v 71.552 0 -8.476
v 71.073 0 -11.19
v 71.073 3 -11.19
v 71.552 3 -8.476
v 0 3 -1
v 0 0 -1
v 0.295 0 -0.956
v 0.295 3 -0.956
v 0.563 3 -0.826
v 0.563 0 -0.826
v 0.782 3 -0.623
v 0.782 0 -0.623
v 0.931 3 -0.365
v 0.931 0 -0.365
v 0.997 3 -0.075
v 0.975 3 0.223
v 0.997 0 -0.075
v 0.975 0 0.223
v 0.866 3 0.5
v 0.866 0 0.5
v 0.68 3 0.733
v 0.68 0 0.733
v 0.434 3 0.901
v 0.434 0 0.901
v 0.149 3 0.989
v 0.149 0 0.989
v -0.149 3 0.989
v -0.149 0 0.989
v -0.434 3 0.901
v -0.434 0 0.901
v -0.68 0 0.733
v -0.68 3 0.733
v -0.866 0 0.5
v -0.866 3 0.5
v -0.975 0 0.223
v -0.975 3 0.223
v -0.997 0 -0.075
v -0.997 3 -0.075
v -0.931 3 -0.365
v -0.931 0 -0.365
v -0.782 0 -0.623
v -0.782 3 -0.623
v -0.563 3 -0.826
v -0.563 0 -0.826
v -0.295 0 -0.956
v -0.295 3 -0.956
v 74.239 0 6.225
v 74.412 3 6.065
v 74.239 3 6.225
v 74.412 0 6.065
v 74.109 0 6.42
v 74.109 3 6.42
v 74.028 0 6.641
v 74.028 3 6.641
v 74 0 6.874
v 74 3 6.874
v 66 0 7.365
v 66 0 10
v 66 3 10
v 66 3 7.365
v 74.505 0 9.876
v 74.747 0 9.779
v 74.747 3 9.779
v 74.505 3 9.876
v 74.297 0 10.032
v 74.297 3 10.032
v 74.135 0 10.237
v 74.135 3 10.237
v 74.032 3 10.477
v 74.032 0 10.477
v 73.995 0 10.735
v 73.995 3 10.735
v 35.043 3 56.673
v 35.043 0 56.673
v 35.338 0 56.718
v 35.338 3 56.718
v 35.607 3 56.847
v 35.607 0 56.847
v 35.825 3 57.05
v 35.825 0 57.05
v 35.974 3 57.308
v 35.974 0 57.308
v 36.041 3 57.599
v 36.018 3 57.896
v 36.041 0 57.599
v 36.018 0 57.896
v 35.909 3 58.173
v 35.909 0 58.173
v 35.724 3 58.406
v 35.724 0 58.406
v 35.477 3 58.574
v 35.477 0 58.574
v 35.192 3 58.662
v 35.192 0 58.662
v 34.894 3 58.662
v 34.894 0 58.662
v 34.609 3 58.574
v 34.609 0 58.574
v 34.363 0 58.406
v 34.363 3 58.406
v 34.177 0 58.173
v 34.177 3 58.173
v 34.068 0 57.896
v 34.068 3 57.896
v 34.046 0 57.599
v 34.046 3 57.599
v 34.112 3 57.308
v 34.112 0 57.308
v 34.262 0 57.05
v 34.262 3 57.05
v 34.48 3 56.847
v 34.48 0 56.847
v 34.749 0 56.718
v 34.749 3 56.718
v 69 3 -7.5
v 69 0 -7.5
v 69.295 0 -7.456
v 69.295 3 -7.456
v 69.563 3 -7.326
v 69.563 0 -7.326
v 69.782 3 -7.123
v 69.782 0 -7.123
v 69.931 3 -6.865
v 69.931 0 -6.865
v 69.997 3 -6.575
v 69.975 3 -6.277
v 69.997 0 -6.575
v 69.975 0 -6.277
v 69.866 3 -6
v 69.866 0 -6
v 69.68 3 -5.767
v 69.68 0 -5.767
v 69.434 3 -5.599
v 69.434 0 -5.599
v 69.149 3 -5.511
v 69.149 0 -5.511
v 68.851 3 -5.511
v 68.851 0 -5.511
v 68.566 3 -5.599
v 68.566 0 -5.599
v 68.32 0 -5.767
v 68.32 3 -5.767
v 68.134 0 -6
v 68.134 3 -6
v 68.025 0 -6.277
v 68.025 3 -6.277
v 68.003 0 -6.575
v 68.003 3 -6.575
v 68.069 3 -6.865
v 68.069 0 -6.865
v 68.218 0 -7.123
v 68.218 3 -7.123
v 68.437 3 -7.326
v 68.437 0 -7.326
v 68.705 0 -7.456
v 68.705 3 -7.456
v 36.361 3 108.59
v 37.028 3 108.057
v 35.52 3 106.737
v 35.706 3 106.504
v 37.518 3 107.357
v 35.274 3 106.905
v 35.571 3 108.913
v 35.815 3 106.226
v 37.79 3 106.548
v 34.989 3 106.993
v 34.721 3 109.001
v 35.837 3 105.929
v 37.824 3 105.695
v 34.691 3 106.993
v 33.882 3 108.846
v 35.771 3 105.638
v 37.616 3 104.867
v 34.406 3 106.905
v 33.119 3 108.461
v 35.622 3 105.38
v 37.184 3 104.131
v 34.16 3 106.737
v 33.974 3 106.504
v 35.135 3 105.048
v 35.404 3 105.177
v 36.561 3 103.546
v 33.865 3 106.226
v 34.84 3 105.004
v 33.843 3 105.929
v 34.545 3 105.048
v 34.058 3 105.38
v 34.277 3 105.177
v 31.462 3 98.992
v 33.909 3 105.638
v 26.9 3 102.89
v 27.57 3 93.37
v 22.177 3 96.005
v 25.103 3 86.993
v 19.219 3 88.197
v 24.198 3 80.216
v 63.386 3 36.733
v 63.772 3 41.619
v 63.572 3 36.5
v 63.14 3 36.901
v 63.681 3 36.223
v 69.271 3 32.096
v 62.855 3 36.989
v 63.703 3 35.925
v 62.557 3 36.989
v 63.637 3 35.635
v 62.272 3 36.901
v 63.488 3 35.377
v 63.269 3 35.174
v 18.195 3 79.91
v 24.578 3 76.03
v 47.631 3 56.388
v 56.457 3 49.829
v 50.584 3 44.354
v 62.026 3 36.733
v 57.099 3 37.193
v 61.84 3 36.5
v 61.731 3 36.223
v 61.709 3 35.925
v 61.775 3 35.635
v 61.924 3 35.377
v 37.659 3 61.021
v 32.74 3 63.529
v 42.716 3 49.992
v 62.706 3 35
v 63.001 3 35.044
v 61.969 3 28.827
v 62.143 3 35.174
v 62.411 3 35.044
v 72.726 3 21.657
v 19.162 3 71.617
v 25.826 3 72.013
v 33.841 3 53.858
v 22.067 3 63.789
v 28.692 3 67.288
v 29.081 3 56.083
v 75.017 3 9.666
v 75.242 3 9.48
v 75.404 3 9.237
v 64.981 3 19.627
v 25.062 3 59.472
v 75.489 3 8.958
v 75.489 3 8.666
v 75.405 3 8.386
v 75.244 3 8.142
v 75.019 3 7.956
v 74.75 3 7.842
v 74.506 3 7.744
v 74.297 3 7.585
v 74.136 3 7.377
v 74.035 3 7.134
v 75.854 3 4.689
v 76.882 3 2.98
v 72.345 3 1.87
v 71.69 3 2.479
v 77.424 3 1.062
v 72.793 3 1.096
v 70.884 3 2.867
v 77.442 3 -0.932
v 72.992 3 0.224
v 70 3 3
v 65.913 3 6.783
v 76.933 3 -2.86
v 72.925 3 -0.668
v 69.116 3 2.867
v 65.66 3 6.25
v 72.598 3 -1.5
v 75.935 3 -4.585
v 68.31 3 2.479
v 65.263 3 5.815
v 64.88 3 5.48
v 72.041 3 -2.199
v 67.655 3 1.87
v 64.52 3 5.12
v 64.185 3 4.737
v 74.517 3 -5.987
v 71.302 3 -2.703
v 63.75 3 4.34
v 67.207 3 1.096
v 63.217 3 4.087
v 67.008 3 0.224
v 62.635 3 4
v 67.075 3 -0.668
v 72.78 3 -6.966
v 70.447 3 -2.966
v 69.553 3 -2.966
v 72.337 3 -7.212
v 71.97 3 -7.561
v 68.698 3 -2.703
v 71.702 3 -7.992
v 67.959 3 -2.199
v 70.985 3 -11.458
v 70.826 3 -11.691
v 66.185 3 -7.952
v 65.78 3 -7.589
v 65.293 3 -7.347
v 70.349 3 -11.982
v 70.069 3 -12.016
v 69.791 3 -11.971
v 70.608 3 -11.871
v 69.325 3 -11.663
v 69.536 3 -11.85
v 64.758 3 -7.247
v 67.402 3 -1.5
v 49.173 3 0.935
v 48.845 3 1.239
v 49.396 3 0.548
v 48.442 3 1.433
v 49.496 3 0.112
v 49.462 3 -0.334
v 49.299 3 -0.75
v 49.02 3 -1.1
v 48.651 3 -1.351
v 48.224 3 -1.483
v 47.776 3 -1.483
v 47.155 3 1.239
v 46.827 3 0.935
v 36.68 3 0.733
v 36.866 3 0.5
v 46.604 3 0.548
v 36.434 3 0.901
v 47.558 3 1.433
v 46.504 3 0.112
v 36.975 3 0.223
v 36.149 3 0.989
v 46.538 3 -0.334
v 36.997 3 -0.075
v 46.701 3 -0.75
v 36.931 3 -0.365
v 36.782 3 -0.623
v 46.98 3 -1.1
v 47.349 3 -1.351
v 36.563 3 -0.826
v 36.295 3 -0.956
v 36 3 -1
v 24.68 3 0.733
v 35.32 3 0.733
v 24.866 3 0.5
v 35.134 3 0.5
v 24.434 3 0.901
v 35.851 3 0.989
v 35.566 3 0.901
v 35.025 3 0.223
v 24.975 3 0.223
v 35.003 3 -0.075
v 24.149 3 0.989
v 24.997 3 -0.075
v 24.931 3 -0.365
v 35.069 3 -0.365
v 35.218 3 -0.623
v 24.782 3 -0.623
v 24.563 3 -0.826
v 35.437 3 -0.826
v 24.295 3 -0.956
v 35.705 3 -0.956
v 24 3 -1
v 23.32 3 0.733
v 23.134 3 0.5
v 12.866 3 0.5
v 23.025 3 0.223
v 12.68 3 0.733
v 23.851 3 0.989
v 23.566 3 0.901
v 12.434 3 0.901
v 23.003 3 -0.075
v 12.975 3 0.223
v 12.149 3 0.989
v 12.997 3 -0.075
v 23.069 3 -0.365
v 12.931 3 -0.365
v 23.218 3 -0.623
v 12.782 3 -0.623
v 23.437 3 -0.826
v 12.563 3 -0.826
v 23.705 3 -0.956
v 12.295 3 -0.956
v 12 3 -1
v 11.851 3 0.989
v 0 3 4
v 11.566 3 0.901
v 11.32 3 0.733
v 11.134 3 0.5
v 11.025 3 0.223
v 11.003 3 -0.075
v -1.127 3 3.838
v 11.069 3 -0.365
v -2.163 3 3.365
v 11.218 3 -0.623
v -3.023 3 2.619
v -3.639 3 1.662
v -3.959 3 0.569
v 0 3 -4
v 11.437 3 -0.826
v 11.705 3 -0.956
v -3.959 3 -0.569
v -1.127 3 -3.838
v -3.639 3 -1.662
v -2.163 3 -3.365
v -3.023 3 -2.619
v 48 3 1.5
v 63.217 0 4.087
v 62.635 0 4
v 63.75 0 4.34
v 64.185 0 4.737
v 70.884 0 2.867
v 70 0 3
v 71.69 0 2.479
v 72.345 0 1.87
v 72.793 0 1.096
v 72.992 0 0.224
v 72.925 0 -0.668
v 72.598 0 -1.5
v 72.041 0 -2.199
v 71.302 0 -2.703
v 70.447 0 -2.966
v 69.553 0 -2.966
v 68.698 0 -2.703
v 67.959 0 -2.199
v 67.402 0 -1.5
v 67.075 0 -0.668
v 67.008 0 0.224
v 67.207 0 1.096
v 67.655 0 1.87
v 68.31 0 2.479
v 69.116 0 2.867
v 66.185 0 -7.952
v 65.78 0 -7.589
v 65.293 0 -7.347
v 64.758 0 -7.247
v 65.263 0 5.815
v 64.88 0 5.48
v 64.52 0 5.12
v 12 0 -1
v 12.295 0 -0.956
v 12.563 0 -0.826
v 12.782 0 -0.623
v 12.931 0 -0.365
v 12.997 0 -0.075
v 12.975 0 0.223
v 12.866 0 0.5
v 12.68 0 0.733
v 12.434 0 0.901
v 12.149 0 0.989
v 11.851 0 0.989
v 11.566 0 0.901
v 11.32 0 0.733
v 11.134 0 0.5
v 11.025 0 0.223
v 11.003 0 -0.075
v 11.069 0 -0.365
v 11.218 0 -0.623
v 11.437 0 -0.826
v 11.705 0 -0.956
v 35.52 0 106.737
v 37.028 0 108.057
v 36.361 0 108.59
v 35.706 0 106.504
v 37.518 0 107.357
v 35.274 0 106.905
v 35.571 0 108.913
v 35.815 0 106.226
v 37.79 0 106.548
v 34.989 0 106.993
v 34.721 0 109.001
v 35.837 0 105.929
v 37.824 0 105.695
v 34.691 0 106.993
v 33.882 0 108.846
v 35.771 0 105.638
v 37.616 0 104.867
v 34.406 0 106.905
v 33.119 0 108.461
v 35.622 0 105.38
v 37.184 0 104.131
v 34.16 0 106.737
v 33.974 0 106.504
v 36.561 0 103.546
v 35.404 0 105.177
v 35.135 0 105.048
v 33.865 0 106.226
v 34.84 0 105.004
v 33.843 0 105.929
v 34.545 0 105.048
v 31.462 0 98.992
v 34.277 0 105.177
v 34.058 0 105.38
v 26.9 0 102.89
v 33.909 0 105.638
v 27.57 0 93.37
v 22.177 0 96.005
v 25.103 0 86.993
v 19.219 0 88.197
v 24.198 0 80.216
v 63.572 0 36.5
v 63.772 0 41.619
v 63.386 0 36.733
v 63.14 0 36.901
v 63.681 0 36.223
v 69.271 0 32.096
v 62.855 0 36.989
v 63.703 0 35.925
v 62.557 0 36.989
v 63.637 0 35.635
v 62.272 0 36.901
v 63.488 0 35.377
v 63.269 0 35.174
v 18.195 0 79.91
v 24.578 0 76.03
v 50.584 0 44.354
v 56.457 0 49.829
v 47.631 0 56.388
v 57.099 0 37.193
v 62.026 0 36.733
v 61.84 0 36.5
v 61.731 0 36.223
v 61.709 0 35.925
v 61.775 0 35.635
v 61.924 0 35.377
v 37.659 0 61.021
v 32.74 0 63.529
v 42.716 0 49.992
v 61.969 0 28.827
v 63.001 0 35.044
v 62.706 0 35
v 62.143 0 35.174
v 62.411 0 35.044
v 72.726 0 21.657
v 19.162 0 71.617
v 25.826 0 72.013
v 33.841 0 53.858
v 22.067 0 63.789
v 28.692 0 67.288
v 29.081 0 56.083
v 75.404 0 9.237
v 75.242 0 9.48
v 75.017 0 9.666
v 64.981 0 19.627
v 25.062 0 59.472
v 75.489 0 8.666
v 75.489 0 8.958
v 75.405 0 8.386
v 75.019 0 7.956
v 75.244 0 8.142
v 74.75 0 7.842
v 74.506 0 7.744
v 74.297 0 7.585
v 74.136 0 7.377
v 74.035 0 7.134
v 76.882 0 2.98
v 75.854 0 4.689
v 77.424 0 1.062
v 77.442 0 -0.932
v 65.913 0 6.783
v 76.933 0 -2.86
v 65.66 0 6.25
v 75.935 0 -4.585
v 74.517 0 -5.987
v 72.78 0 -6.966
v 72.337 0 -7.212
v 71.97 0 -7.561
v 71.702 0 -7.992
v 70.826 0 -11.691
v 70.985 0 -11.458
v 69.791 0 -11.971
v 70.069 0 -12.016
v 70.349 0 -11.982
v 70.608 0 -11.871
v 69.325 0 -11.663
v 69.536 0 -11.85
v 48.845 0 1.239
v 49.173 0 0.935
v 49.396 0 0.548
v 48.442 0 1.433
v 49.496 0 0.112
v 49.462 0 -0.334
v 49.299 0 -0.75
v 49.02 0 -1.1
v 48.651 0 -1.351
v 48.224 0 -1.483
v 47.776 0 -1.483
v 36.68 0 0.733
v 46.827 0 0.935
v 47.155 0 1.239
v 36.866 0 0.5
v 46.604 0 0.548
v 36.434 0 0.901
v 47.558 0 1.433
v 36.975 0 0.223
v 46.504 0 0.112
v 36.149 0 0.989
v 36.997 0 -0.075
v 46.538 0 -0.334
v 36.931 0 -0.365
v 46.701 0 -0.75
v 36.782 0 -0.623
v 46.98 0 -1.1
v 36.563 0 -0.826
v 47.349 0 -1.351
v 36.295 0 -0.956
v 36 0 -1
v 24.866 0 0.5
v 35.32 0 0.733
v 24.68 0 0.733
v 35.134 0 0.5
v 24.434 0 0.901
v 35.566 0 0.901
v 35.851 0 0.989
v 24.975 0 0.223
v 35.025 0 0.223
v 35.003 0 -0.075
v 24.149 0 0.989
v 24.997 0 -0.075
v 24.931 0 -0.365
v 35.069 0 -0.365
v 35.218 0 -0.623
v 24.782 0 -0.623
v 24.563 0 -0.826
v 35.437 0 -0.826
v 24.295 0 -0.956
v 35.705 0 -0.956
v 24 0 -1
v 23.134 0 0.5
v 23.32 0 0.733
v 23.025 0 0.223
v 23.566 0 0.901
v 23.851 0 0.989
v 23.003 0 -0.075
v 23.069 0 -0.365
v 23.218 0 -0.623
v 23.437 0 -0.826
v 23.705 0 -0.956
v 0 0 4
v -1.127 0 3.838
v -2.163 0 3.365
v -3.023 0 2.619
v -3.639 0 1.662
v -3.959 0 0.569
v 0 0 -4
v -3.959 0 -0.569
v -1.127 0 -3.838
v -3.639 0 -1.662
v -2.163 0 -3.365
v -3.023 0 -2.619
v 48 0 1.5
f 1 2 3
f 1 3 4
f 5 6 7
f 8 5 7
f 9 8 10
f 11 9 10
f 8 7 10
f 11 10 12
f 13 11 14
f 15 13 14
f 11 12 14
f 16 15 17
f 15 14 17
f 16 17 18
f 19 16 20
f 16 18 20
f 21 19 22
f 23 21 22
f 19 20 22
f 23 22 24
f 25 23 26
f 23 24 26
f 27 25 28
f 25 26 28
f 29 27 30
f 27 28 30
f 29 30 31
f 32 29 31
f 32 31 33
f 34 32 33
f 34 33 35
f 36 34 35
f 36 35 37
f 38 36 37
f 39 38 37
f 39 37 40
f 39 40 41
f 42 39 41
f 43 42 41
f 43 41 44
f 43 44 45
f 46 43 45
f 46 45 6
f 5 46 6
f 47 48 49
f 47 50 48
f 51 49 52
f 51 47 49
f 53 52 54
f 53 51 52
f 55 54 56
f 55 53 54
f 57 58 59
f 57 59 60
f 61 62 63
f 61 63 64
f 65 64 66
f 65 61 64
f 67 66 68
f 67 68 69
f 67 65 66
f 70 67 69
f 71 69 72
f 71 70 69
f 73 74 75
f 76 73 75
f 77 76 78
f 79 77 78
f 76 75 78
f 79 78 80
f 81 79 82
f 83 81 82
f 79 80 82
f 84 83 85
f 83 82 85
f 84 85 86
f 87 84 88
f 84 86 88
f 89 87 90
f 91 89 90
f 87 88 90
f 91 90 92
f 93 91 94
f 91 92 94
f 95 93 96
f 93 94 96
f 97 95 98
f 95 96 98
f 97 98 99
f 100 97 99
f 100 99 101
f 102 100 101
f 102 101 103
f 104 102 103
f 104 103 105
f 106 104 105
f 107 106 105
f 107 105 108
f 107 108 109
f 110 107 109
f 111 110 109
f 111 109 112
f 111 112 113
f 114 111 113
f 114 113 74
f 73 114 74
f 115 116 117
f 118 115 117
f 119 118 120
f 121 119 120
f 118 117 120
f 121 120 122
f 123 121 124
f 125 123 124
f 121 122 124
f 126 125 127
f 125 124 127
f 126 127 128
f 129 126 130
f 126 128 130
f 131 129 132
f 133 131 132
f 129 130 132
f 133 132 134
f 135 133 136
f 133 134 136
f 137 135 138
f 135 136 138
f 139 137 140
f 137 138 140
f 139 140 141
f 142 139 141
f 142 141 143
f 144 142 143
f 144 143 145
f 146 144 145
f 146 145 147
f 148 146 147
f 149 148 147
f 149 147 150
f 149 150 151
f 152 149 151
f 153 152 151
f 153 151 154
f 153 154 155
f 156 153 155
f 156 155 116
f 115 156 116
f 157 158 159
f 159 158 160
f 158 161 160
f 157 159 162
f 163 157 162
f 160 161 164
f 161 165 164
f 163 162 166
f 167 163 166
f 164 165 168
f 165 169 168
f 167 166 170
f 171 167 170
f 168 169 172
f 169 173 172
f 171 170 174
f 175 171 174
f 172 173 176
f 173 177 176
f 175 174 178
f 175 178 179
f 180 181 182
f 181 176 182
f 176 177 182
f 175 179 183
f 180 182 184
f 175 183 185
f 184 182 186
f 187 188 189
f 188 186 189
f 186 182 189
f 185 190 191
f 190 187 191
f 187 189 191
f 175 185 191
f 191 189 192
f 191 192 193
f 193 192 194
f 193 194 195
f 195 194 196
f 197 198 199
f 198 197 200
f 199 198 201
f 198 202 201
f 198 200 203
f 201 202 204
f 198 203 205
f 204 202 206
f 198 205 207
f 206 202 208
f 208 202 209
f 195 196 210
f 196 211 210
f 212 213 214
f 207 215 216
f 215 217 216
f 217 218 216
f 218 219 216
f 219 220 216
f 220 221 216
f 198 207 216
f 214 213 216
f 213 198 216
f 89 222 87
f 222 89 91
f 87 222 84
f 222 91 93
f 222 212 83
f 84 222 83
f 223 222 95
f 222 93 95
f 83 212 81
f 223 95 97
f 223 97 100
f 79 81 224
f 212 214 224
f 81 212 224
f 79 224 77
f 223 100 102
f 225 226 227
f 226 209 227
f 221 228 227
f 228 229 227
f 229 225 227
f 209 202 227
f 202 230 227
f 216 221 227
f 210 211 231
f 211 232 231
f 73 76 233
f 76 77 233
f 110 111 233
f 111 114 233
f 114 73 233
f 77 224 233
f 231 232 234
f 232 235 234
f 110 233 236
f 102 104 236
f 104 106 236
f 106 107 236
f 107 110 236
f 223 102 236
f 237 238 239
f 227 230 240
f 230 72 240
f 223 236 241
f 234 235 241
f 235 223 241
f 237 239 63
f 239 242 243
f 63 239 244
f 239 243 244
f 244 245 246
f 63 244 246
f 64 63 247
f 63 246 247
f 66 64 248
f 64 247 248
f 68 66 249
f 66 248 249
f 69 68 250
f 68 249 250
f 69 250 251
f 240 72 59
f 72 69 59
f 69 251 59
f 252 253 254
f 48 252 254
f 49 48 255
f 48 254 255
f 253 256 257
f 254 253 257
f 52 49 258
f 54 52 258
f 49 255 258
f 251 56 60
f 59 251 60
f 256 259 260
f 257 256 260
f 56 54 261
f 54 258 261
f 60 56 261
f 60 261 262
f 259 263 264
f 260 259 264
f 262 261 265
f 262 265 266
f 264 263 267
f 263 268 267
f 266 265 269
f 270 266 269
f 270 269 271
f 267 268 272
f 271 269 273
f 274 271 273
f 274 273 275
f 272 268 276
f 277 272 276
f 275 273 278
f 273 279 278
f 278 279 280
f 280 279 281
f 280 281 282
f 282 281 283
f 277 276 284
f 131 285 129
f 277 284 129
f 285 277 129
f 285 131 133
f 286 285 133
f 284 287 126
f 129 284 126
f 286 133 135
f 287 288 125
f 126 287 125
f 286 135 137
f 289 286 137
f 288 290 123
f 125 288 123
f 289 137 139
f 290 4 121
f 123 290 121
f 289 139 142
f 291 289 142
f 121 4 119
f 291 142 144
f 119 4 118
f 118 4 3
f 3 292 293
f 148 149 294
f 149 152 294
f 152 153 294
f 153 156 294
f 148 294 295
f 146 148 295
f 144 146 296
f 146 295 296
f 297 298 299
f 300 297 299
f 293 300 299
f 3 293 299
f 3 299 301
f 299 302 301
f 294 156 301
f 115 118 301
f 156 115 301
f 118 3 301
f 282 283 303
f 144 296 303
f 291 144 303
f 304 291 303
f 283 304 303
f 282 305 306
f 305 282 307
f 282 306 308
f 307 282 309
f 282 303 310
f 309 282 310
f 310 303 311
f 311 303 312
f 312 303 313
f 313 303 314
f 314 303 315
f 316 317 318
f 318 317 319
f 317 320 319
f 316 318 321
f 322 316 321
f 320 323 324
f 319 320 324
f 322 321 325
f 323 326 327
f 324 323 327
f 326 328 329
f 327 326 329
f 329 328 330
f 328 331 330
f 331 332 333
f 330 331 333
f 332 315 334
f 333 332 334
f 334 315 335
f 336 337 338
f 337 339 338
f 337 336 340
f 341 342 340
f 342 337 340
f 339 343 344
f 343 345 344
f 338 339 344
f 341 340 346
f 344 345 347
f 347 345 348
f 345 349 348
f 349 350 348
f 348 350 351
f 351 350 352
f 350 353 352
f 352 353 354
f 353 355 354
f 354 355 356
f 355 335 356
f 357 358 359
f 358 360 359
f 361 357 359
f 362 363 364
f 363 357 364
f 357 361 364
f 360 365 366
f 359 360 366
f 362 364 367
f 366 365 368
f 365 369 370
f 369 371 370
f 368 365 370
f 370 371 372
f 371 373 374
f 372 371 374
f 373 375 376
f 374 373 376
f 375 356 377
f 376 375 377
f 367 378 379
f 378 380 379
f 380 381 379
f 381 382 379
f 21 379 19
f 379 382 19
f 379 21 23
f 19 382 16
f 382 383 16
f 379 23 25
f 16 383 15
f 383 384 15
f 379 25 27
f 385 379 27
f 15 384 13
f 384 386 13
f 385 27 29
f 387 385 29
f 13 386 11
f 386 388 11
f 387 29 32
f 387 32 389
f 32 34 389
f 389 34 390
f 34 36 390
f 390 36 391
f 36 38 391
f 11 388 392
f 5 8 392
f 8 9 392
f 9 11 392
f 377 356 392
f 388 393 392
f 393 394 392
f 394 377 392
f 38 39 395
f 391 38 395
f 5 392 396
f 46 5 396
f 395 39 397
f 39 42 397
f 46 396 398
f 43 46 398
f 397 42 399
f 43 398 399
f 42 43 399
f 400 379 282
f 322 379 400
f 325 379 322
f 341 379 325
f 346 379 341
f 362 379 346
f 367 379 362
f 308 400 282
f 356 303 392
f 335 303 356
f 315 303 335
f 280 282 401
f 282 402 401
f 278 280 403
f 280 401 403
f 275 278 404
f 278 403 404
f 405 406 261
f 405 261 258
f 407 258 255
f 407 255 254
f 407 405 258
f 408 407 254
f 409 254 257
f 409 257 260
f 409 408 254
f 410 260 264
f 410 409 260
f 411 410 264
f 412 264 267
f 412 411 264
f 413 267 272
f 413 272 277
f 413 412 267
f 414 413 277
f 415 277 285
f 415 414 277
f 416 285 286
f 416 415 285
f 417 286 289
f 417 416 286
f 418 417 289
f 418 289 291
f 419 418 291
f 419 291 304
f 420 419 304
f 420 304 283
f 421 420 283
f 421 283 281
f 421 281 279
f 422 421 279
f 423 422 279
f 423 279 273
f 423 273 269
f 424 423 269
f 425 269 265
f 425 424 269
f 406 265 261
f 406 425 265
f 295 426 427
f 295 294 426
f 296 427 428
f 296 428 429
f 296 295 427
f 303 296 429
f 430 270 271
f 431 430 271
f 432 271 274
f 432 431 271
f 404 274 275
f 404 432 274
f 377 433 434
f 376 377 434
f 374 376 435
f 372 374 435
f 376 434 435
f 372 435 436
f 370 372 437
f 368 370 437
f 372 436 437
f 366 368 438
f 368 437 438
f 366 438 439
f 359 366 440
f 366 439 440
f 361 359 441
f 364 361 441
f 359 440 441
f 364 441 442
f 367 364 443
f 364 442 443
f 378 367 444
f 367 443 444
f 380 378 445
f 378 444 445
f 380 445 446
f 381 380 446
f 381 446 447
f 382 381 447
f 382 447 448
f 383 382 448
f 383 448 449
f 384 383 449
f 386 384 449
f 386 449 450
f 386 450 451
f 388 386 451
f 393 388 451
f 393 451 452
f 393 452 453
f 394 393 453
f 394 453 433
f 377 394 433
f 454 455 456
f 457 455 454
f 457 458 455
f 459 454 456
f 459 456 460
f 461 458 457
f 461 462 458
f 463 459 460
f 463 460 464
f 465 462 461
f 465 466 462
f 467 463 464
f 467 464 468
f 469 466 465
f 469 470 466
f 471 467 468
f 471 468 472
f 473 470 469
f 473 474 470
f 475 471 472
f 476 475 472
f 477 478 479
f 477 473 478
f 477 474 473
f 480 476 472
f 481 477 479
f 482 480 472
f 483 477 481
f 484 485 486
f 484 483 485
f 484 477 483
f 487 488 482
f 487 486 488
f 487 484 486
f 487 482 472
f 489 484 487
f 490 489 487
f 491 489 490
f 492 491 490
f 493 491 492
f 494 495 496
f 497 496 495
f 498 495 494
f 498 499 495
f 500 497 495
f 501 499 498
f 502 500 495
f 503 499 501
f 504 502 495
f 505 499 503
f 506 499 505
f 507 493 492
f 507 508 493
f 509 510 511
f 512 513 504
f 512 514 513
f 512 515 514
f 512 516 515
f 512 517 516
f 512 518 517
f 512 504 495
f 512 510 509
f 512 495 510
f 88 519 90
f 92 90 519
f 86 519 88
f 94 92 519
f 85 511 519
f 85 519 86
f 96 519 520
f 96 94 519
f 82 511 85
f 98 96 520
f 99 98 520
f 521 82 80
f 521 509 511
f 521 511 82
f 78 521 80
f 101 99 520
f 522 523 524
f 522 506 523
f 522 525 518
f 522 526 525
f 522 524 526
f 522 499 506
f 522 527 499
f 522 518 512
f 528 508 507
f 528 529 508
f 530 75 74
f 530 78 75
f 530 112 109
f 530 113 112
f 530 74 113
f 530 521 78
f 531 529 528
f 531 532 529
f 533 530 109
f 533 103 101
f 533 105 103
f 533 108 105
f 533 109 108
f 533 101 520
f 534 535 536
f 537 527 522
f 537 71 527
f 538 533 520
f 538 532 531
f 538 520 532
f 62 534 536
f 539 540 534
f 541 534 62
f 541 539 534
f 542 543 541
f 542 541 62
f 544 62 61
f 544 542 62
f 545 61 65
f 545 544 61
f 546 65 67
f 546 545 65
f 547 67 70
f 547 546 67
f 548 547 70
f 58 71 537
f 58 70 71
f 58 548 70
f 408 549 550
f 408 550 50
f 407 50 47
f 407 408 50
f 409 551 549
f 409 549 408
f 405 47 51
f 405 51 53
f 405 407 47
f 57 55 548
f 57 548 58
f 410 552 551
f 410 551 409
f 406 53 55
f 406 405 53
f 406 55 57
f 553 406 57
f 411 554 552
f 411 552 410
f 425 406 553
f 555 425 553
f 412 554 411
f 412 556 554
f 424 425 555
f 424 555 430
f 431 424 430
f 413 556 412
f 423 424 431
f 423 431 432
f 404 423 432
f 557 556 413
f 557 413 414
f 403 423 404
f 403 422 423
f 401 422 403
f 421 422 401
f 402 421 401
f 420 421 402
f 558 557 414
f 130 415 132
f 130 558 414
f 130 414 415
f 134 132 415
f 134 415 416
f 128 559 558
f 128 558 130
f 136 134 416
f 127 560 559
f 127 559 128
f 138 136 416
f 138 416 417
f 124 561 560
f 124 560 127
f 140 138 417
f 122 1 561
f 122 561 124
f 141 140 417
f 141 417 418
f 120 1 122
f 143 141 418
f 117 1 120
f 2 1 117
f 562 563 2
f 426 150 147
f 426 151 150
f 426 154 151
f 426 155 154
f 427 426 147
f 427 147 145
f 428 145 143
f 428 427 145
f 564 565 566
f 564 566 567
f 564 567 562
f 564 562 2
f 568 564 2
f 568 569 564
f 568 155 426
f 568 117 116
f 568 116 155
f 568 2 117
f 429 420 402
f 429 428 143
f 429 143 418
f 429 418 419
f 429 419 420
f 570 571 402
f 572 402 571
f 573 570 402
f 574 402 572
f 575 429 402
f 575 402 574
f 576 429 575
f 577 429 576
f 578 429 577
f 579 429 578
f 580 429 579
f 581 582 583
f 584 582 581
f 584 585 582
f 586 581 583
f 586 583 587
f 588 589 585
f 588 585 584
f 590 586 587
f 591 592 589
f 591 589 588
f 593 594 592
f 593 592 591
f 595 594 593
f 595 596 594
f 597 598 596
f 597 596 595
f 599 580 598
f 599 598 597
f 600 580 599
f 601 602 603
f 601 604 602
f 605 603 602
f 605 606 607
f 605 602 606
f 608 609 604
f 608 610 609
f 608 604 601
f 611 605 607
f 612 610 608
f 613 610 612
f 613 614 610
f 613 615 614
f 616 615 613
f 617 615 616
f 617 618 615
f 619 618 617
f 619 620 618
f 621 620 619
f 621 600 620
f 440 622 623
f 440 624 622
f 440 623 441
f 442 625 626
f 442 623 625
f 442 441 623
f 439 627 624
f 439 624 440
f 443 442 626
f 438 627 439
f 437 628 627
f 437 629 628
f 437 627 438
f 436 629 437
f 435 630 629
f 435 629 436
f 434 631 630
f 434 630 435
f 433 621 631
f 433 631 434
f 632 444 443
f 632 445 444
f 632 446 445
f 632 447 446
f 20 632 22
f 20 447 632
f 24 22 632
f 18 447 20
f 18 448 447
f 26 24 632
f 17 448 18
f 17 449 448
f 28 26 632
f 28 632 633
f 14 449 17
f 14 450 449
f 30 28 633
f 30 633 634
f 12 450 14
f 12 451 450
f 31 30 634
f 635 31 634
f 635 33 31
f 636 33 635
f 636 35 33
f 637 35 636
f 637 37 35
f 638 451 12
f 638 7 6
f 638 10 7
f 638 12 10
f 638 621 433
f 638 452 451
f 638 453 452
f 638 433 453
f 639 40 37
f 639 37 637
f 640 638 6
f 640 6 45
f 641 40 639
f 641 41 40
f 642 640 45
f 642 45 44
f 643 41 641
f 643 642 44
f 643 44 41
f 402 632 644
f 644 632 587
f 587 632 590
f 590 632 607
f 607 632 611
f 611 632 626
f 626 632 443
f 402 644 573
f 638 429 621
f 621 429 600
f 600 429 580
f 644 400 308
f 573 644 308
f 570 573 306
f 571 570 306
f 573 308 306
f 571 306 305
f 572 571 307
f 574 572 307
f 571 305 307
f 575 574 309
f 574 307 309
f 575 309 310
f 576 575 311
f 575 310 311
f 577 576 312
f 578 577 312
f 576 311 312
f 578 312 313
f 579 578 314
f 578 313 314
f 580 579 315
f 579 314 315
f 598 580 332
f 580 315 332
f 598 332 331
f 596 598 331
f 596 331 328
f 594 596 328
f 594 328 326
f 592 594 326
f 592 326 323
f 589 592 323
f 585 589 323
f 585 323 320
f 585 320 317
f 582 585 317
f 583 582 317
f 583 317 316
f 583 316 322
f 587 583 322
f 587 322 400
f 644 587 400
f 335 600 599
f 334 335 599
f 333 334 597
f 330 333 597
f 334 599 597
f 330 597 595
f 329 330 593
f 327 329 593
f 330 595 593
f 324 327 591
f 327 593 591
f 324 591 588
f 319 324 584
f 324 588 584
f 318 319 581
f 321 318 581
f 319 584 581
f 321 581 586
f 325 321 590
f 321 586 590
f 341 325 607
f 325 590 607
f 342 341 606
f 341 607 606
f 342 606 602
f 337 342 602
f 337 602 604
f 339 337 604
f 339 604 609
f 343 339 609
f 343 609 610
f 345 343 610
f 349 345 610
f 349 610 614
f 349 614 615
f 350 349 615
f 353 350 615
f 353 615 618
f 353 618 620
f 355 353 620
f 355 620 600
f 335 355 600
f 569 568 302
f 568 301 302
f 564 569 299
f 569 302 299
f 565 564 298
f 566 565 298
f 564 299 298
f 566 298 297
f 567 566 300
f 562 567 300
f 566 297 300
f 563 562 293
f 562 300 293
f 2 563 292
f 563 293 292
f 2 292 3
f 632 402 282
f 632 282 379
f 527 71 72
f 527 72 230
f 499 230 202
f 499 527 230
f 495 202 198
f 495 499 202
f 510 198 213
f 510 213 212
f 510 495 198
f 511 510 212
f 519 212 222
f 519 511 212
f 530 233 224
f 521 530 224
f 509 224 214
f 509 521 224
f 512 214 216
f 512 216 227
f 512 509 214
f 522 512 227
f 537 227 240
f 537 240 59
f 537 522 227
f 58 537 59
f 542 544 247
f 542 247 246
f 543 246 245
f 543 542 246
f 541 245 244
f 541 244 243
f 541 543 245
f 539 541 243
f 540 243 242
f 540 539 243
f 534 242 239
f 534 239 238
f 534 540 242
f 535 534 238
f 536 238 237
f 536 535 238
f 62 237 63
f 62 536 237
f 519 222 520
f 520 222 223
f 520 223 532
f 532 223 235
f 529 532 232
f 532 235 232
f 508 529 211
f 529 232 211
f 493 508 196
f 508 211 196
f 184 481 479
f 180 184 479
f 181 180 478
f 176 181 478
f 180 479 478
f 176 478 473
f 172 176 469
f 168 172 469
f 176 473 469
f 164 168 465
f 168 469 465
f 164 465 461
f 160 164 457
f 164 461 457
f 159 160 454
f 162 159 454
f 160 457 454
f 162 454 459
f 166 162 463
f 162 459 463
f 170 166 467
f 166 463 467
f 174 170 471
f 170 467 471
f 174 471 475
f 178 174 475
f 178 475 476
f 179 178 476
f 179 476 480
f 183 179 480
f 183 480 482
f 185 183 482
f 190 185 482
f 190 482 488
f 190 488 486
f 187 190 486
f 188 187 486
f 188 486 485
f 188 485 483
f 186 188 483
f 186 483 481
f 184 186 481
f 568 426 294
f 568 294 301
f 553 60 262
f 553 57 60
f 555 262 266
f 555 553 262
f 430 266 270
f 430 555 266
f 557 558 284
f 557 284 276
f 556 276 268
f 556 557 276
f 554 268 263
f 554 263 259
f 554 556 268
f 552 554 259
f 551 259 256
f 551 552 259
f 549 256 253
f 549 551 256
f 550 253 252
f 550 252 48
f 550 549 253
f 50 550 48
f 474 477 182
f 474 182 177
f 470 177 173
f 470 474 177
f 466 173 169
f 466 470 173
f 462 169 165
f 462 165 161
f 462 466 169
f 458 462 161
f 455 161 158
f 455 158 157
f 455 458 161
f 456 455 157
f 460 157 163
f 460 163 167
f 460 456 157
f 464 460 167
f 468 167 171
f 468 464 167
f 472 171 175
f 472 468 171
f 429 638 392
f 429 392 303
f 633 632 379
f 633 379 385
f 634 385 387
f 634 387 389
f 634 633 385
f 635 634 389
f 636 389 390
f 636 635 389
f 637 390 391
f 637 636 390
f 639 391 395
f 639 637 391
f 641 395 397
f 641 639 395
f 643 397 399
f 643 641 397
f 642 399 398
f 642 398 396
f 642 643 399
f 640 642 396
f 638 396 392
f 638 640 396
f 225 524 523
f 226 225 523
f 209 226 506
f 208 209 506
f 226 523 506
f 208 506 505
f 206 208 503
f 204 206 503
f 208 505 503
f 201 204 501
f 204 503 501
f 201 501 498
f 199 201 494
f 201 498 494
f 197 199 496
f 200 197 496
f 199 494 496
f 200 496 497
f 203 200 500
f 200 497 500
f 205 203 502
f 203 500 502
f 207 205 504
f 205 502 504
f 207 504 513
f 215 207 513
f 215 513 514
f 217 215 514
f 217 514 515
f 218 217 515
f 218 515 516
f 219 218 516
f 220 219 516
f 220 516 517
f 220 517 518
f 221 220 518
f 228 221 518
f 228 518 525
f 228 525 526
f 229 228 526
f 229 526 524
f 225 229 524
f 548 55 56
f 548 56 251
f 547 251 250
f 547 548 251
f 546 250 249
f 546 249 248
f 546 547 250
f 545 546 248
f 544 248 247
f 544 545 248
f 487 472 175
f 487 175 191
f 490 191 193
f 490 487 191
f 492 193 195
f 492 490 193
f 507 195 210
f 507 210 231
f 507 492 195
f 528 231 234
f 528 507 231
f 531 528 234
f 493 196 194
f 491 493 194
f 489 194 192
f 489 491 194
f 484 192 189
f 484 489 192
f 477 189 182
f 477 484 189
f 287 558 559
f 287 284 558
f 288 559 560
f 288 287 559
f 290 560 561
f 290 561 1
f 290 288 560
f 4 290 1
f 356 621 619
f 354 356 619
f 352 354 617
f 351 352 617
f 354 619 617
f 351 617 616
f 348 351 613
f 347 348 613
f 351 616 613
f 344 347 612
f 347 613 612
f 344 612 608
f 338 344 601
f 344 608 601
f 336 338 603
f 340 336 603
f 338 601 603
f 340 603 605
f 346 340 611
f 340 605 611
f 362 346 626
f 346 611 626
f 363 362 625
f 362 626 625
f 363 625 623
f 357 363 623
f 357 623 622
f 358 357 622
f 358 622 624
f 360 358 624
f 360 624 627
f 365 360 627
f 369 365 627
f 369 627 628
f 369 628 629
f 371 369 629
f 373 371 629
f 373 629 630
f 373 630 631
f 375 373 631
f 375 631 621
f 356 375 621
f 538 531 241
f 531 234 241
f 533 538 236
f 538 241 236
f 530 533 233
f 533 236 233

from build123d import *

# Parameters (mm, degrees)
SKETCH_1_R          = 3
EXTRUDE_1_DEPTH     = 3
EXTRUDE_START       = -3
SKETCH_2_R          = 3
EXTRUDE_2_DEPTH     = 3
EXTRUDE_4_DEPTH     = 3
FILLET_1_R          = 20
SKETCH_4_R          = 1
CUT_EXTRUDE_2_DEPTH = 134.77989332
SKETCH_5_R          = 1.5
CUT_EXTRUDE_3_DEPTH = 134.77989332
EXTRUDE_5_DEPTH     = 3
FILLET_2_R          = 2
FILLET_3_R          = 1


with BuildPart() as part:
    # 草图1 → 凸台-拉伸1 (new body)
    with BuildSketch(Plane(origin=(0, 0, 0), x_dir=(1, 0, 0), z_dir=(0, 1, 0))):
        with BuildLine():
            Line((0, 4), (70, 4))
            ThreePointArc((70, 4), (72.828427125, 2.828427125), (74, 0))
            Line((74, 0), (74, -10))
            ThreePointArc((74, -10), (61.386213612, -44.681924543), (29.439223407, -63.157132631))
            ThreePointArc((29.439223407, -63.157132631), (24.635207854, -84.826646437), (36.560916037, -103.546258569))
            ThreePointArc((36.560916037, -103.546258569), (37.297642861, -107.724444011), (33.119457419, -108.461170835))
            ThreePointArc((33.119457419, -108.461170835), (18.340459825, -82.982499926), (28.246224292, -55.243407089))
            ThreePointArc((28.246224292, -55.243407089), (55.321795077, -39.463169658), (66, -10))
            Line((66, -10), (66, -4))
            Line((66, -4), (0, -4))
            ThreePointArc((0, -4), (-4, 0), (0, 4))
        make_face()
        with Locations(Location((70, 0, 0), (0, 0, 270))):
            Circle(SKETCH_1_R, mode=Mode.SUBTRACT)
    extrude(amount=EXTRUDE_1_DEPTH)

    # 草图2 → 凸台-拉伸2 (add)
    with BuildSketch(Plane(origin=(0, 3, 0), x_dir=(1, 0, 0), z_dir=(0, 1, 0)).offset(EXTRUDE_START)):
        with BuildLine():
            Line((0, 4), (69.624462411, 7.490592201))
            ThreePointArc((69.624462411, 7.490592201), (73.786168915, -6.474173689), (63.65571123, 4))
            Line((63.65571123, 4), (0, 4))
        make_face()
        with Locations(Location((70, 0, 0), (0, 0, 270))):
            Circle(SKETCH_2_R, mode=Mode.SUBTRACT)
    extrude(amount=EXTRUDE_2_DEPTH)

    # 草图6 → 凸台-拉伸4 (add)
    with BuildSketch(Plane.XZ):
        with BuildLine():
            Line((70.702827497, -13.290378643), (71.760789381, -7.290378643))
            ThreePointArc((71.760789381, -7.290378643), (70.699822834, -7.467278487), (69.624462411, -7.490592201))
            Line((69.624462411, -7.490592201), (65.624462411, -7.290053937))
            Line((65.624462411, -7.290053937), (70.702827497, -13.290378643))
        make_face()
    extrude(amount=-EXTRUDE_4_DEPTH)

    # 圆角1
    fillet_1_edges = [part.edges().sort_by_distance(p)[0] for p in [
        (29.439223407, 1.5, 63.157132631),
        (28.246224292, 1.5, 55.243407089),
    ]]
    fillet(fillet_1_edges, radius=FILLET_1_R)

    # 草图4 → 切除-拉伸2 (cut, through all)
    with BuildSketch(Plane.XZ):
        with Locations(Location((62.705974414, 36, 0), (0, 0, 270))):
            Circle(SKETCH_4_R)
        with Locations(Location((34.840186728, 106.003714702, 0), (0, 0, 270))):
            Circle(SKETCH_4_R)
        with Locations(Location((0, 0, 0), (0, 0, 270))):
            Circle(SKETCH_4_R)
        with Locations(Location((69, -6.5, 0), (0, 0, 270))):
            Circle(SKETCH_4_R)
        with Locations(Location((12, 0, 0), (0, 0, 270))):
            Circle(SKETCH_4_R)
        with Locations(Location((24, 0, 0), (0, 0, 270))):
            Circle(SKETCH_4_R)
        with Locations(Location((36, 0, 0), (0, 0, 270))):
            Circle(SKETCH_4_R)
        with Locations(Location((35.04334559, 57.673267705, 0), (0, 0, 270))):
            Circle(SKETCH_4_R)
    extrude(amount=-CUT_EXTRUDE_2_DEPTH, mode=Mode.SUBTRACT)

    # 草图5 → 切除-拉伸3 (cut, through all)
    with BuildSketch(Plane(origin=(0, 3, 0), x_dir=(1, 0, 0), z_dir=(0, 1, 0))):
        with Locations(Location((48, 0, 0), (0, 0, 270))):
            Circle(SKETCH_5_R)
    extrude(amount=-CUT_EXTRUDE_3_DEPTH, mode=Mode.SUBTRACT)

    # 草图9 → 凸台-拉伸5 (add)
    with BuildSketch(Plane(origin=(0, 3, 0), x_dir=(1, 0, 0), z_dir=(0, 1, 0)).offset(EXTRUDE_START)):
        with BuildLine():
            Line((74, -10), (74, -6.873863542))
            ThreePointArc((74, -6.873863542), (74.209430585, -7.486235978), (74.75, -7.842109379))
            ThreePointArc((74.75, -7.842109379), (75.499999137, -8.811669003), (74.747455001, -9.779254603))
            ThreePointArc((74.747455001, -9.779254603), (74.20933726, -10.129384674), (73.995002571, -10.734547803))
            ThreePointArc((73.995002571, -10.734547803), (73.998750628, -10.367282401), (74, -10))
        make_face()
    extrude(amount=EXTRUDE_5_DEPTH)

    # 圆角2
    fillet_2_edges = [part.edges().sort_by_distance(p)[0] for p in [
        (0, 1.5, -4),
        (66, 1.5, 6.34428877),
        (63.65571123, 1.5, 4),
        (65.624462411, 1.5, -7.290053937),
        (71.760789381, 1.5, -7.290378643),
    ]]
    fillet(fillet_2_edges, radius=FILLET_2_R)

    # 圆角3
    fillet_3_edges = [part.edges().sort_by_distance(p)[0] for p in [
        (70.702827497, 1.5, -13.290378643),
        (74, 1.5, 6.34428877),
    ]]
    fillet(fillet_3_edges, radius=FILLET_3_R - 0.0001)  # a hair under: the kernel refuses the full size


solid = part.part
